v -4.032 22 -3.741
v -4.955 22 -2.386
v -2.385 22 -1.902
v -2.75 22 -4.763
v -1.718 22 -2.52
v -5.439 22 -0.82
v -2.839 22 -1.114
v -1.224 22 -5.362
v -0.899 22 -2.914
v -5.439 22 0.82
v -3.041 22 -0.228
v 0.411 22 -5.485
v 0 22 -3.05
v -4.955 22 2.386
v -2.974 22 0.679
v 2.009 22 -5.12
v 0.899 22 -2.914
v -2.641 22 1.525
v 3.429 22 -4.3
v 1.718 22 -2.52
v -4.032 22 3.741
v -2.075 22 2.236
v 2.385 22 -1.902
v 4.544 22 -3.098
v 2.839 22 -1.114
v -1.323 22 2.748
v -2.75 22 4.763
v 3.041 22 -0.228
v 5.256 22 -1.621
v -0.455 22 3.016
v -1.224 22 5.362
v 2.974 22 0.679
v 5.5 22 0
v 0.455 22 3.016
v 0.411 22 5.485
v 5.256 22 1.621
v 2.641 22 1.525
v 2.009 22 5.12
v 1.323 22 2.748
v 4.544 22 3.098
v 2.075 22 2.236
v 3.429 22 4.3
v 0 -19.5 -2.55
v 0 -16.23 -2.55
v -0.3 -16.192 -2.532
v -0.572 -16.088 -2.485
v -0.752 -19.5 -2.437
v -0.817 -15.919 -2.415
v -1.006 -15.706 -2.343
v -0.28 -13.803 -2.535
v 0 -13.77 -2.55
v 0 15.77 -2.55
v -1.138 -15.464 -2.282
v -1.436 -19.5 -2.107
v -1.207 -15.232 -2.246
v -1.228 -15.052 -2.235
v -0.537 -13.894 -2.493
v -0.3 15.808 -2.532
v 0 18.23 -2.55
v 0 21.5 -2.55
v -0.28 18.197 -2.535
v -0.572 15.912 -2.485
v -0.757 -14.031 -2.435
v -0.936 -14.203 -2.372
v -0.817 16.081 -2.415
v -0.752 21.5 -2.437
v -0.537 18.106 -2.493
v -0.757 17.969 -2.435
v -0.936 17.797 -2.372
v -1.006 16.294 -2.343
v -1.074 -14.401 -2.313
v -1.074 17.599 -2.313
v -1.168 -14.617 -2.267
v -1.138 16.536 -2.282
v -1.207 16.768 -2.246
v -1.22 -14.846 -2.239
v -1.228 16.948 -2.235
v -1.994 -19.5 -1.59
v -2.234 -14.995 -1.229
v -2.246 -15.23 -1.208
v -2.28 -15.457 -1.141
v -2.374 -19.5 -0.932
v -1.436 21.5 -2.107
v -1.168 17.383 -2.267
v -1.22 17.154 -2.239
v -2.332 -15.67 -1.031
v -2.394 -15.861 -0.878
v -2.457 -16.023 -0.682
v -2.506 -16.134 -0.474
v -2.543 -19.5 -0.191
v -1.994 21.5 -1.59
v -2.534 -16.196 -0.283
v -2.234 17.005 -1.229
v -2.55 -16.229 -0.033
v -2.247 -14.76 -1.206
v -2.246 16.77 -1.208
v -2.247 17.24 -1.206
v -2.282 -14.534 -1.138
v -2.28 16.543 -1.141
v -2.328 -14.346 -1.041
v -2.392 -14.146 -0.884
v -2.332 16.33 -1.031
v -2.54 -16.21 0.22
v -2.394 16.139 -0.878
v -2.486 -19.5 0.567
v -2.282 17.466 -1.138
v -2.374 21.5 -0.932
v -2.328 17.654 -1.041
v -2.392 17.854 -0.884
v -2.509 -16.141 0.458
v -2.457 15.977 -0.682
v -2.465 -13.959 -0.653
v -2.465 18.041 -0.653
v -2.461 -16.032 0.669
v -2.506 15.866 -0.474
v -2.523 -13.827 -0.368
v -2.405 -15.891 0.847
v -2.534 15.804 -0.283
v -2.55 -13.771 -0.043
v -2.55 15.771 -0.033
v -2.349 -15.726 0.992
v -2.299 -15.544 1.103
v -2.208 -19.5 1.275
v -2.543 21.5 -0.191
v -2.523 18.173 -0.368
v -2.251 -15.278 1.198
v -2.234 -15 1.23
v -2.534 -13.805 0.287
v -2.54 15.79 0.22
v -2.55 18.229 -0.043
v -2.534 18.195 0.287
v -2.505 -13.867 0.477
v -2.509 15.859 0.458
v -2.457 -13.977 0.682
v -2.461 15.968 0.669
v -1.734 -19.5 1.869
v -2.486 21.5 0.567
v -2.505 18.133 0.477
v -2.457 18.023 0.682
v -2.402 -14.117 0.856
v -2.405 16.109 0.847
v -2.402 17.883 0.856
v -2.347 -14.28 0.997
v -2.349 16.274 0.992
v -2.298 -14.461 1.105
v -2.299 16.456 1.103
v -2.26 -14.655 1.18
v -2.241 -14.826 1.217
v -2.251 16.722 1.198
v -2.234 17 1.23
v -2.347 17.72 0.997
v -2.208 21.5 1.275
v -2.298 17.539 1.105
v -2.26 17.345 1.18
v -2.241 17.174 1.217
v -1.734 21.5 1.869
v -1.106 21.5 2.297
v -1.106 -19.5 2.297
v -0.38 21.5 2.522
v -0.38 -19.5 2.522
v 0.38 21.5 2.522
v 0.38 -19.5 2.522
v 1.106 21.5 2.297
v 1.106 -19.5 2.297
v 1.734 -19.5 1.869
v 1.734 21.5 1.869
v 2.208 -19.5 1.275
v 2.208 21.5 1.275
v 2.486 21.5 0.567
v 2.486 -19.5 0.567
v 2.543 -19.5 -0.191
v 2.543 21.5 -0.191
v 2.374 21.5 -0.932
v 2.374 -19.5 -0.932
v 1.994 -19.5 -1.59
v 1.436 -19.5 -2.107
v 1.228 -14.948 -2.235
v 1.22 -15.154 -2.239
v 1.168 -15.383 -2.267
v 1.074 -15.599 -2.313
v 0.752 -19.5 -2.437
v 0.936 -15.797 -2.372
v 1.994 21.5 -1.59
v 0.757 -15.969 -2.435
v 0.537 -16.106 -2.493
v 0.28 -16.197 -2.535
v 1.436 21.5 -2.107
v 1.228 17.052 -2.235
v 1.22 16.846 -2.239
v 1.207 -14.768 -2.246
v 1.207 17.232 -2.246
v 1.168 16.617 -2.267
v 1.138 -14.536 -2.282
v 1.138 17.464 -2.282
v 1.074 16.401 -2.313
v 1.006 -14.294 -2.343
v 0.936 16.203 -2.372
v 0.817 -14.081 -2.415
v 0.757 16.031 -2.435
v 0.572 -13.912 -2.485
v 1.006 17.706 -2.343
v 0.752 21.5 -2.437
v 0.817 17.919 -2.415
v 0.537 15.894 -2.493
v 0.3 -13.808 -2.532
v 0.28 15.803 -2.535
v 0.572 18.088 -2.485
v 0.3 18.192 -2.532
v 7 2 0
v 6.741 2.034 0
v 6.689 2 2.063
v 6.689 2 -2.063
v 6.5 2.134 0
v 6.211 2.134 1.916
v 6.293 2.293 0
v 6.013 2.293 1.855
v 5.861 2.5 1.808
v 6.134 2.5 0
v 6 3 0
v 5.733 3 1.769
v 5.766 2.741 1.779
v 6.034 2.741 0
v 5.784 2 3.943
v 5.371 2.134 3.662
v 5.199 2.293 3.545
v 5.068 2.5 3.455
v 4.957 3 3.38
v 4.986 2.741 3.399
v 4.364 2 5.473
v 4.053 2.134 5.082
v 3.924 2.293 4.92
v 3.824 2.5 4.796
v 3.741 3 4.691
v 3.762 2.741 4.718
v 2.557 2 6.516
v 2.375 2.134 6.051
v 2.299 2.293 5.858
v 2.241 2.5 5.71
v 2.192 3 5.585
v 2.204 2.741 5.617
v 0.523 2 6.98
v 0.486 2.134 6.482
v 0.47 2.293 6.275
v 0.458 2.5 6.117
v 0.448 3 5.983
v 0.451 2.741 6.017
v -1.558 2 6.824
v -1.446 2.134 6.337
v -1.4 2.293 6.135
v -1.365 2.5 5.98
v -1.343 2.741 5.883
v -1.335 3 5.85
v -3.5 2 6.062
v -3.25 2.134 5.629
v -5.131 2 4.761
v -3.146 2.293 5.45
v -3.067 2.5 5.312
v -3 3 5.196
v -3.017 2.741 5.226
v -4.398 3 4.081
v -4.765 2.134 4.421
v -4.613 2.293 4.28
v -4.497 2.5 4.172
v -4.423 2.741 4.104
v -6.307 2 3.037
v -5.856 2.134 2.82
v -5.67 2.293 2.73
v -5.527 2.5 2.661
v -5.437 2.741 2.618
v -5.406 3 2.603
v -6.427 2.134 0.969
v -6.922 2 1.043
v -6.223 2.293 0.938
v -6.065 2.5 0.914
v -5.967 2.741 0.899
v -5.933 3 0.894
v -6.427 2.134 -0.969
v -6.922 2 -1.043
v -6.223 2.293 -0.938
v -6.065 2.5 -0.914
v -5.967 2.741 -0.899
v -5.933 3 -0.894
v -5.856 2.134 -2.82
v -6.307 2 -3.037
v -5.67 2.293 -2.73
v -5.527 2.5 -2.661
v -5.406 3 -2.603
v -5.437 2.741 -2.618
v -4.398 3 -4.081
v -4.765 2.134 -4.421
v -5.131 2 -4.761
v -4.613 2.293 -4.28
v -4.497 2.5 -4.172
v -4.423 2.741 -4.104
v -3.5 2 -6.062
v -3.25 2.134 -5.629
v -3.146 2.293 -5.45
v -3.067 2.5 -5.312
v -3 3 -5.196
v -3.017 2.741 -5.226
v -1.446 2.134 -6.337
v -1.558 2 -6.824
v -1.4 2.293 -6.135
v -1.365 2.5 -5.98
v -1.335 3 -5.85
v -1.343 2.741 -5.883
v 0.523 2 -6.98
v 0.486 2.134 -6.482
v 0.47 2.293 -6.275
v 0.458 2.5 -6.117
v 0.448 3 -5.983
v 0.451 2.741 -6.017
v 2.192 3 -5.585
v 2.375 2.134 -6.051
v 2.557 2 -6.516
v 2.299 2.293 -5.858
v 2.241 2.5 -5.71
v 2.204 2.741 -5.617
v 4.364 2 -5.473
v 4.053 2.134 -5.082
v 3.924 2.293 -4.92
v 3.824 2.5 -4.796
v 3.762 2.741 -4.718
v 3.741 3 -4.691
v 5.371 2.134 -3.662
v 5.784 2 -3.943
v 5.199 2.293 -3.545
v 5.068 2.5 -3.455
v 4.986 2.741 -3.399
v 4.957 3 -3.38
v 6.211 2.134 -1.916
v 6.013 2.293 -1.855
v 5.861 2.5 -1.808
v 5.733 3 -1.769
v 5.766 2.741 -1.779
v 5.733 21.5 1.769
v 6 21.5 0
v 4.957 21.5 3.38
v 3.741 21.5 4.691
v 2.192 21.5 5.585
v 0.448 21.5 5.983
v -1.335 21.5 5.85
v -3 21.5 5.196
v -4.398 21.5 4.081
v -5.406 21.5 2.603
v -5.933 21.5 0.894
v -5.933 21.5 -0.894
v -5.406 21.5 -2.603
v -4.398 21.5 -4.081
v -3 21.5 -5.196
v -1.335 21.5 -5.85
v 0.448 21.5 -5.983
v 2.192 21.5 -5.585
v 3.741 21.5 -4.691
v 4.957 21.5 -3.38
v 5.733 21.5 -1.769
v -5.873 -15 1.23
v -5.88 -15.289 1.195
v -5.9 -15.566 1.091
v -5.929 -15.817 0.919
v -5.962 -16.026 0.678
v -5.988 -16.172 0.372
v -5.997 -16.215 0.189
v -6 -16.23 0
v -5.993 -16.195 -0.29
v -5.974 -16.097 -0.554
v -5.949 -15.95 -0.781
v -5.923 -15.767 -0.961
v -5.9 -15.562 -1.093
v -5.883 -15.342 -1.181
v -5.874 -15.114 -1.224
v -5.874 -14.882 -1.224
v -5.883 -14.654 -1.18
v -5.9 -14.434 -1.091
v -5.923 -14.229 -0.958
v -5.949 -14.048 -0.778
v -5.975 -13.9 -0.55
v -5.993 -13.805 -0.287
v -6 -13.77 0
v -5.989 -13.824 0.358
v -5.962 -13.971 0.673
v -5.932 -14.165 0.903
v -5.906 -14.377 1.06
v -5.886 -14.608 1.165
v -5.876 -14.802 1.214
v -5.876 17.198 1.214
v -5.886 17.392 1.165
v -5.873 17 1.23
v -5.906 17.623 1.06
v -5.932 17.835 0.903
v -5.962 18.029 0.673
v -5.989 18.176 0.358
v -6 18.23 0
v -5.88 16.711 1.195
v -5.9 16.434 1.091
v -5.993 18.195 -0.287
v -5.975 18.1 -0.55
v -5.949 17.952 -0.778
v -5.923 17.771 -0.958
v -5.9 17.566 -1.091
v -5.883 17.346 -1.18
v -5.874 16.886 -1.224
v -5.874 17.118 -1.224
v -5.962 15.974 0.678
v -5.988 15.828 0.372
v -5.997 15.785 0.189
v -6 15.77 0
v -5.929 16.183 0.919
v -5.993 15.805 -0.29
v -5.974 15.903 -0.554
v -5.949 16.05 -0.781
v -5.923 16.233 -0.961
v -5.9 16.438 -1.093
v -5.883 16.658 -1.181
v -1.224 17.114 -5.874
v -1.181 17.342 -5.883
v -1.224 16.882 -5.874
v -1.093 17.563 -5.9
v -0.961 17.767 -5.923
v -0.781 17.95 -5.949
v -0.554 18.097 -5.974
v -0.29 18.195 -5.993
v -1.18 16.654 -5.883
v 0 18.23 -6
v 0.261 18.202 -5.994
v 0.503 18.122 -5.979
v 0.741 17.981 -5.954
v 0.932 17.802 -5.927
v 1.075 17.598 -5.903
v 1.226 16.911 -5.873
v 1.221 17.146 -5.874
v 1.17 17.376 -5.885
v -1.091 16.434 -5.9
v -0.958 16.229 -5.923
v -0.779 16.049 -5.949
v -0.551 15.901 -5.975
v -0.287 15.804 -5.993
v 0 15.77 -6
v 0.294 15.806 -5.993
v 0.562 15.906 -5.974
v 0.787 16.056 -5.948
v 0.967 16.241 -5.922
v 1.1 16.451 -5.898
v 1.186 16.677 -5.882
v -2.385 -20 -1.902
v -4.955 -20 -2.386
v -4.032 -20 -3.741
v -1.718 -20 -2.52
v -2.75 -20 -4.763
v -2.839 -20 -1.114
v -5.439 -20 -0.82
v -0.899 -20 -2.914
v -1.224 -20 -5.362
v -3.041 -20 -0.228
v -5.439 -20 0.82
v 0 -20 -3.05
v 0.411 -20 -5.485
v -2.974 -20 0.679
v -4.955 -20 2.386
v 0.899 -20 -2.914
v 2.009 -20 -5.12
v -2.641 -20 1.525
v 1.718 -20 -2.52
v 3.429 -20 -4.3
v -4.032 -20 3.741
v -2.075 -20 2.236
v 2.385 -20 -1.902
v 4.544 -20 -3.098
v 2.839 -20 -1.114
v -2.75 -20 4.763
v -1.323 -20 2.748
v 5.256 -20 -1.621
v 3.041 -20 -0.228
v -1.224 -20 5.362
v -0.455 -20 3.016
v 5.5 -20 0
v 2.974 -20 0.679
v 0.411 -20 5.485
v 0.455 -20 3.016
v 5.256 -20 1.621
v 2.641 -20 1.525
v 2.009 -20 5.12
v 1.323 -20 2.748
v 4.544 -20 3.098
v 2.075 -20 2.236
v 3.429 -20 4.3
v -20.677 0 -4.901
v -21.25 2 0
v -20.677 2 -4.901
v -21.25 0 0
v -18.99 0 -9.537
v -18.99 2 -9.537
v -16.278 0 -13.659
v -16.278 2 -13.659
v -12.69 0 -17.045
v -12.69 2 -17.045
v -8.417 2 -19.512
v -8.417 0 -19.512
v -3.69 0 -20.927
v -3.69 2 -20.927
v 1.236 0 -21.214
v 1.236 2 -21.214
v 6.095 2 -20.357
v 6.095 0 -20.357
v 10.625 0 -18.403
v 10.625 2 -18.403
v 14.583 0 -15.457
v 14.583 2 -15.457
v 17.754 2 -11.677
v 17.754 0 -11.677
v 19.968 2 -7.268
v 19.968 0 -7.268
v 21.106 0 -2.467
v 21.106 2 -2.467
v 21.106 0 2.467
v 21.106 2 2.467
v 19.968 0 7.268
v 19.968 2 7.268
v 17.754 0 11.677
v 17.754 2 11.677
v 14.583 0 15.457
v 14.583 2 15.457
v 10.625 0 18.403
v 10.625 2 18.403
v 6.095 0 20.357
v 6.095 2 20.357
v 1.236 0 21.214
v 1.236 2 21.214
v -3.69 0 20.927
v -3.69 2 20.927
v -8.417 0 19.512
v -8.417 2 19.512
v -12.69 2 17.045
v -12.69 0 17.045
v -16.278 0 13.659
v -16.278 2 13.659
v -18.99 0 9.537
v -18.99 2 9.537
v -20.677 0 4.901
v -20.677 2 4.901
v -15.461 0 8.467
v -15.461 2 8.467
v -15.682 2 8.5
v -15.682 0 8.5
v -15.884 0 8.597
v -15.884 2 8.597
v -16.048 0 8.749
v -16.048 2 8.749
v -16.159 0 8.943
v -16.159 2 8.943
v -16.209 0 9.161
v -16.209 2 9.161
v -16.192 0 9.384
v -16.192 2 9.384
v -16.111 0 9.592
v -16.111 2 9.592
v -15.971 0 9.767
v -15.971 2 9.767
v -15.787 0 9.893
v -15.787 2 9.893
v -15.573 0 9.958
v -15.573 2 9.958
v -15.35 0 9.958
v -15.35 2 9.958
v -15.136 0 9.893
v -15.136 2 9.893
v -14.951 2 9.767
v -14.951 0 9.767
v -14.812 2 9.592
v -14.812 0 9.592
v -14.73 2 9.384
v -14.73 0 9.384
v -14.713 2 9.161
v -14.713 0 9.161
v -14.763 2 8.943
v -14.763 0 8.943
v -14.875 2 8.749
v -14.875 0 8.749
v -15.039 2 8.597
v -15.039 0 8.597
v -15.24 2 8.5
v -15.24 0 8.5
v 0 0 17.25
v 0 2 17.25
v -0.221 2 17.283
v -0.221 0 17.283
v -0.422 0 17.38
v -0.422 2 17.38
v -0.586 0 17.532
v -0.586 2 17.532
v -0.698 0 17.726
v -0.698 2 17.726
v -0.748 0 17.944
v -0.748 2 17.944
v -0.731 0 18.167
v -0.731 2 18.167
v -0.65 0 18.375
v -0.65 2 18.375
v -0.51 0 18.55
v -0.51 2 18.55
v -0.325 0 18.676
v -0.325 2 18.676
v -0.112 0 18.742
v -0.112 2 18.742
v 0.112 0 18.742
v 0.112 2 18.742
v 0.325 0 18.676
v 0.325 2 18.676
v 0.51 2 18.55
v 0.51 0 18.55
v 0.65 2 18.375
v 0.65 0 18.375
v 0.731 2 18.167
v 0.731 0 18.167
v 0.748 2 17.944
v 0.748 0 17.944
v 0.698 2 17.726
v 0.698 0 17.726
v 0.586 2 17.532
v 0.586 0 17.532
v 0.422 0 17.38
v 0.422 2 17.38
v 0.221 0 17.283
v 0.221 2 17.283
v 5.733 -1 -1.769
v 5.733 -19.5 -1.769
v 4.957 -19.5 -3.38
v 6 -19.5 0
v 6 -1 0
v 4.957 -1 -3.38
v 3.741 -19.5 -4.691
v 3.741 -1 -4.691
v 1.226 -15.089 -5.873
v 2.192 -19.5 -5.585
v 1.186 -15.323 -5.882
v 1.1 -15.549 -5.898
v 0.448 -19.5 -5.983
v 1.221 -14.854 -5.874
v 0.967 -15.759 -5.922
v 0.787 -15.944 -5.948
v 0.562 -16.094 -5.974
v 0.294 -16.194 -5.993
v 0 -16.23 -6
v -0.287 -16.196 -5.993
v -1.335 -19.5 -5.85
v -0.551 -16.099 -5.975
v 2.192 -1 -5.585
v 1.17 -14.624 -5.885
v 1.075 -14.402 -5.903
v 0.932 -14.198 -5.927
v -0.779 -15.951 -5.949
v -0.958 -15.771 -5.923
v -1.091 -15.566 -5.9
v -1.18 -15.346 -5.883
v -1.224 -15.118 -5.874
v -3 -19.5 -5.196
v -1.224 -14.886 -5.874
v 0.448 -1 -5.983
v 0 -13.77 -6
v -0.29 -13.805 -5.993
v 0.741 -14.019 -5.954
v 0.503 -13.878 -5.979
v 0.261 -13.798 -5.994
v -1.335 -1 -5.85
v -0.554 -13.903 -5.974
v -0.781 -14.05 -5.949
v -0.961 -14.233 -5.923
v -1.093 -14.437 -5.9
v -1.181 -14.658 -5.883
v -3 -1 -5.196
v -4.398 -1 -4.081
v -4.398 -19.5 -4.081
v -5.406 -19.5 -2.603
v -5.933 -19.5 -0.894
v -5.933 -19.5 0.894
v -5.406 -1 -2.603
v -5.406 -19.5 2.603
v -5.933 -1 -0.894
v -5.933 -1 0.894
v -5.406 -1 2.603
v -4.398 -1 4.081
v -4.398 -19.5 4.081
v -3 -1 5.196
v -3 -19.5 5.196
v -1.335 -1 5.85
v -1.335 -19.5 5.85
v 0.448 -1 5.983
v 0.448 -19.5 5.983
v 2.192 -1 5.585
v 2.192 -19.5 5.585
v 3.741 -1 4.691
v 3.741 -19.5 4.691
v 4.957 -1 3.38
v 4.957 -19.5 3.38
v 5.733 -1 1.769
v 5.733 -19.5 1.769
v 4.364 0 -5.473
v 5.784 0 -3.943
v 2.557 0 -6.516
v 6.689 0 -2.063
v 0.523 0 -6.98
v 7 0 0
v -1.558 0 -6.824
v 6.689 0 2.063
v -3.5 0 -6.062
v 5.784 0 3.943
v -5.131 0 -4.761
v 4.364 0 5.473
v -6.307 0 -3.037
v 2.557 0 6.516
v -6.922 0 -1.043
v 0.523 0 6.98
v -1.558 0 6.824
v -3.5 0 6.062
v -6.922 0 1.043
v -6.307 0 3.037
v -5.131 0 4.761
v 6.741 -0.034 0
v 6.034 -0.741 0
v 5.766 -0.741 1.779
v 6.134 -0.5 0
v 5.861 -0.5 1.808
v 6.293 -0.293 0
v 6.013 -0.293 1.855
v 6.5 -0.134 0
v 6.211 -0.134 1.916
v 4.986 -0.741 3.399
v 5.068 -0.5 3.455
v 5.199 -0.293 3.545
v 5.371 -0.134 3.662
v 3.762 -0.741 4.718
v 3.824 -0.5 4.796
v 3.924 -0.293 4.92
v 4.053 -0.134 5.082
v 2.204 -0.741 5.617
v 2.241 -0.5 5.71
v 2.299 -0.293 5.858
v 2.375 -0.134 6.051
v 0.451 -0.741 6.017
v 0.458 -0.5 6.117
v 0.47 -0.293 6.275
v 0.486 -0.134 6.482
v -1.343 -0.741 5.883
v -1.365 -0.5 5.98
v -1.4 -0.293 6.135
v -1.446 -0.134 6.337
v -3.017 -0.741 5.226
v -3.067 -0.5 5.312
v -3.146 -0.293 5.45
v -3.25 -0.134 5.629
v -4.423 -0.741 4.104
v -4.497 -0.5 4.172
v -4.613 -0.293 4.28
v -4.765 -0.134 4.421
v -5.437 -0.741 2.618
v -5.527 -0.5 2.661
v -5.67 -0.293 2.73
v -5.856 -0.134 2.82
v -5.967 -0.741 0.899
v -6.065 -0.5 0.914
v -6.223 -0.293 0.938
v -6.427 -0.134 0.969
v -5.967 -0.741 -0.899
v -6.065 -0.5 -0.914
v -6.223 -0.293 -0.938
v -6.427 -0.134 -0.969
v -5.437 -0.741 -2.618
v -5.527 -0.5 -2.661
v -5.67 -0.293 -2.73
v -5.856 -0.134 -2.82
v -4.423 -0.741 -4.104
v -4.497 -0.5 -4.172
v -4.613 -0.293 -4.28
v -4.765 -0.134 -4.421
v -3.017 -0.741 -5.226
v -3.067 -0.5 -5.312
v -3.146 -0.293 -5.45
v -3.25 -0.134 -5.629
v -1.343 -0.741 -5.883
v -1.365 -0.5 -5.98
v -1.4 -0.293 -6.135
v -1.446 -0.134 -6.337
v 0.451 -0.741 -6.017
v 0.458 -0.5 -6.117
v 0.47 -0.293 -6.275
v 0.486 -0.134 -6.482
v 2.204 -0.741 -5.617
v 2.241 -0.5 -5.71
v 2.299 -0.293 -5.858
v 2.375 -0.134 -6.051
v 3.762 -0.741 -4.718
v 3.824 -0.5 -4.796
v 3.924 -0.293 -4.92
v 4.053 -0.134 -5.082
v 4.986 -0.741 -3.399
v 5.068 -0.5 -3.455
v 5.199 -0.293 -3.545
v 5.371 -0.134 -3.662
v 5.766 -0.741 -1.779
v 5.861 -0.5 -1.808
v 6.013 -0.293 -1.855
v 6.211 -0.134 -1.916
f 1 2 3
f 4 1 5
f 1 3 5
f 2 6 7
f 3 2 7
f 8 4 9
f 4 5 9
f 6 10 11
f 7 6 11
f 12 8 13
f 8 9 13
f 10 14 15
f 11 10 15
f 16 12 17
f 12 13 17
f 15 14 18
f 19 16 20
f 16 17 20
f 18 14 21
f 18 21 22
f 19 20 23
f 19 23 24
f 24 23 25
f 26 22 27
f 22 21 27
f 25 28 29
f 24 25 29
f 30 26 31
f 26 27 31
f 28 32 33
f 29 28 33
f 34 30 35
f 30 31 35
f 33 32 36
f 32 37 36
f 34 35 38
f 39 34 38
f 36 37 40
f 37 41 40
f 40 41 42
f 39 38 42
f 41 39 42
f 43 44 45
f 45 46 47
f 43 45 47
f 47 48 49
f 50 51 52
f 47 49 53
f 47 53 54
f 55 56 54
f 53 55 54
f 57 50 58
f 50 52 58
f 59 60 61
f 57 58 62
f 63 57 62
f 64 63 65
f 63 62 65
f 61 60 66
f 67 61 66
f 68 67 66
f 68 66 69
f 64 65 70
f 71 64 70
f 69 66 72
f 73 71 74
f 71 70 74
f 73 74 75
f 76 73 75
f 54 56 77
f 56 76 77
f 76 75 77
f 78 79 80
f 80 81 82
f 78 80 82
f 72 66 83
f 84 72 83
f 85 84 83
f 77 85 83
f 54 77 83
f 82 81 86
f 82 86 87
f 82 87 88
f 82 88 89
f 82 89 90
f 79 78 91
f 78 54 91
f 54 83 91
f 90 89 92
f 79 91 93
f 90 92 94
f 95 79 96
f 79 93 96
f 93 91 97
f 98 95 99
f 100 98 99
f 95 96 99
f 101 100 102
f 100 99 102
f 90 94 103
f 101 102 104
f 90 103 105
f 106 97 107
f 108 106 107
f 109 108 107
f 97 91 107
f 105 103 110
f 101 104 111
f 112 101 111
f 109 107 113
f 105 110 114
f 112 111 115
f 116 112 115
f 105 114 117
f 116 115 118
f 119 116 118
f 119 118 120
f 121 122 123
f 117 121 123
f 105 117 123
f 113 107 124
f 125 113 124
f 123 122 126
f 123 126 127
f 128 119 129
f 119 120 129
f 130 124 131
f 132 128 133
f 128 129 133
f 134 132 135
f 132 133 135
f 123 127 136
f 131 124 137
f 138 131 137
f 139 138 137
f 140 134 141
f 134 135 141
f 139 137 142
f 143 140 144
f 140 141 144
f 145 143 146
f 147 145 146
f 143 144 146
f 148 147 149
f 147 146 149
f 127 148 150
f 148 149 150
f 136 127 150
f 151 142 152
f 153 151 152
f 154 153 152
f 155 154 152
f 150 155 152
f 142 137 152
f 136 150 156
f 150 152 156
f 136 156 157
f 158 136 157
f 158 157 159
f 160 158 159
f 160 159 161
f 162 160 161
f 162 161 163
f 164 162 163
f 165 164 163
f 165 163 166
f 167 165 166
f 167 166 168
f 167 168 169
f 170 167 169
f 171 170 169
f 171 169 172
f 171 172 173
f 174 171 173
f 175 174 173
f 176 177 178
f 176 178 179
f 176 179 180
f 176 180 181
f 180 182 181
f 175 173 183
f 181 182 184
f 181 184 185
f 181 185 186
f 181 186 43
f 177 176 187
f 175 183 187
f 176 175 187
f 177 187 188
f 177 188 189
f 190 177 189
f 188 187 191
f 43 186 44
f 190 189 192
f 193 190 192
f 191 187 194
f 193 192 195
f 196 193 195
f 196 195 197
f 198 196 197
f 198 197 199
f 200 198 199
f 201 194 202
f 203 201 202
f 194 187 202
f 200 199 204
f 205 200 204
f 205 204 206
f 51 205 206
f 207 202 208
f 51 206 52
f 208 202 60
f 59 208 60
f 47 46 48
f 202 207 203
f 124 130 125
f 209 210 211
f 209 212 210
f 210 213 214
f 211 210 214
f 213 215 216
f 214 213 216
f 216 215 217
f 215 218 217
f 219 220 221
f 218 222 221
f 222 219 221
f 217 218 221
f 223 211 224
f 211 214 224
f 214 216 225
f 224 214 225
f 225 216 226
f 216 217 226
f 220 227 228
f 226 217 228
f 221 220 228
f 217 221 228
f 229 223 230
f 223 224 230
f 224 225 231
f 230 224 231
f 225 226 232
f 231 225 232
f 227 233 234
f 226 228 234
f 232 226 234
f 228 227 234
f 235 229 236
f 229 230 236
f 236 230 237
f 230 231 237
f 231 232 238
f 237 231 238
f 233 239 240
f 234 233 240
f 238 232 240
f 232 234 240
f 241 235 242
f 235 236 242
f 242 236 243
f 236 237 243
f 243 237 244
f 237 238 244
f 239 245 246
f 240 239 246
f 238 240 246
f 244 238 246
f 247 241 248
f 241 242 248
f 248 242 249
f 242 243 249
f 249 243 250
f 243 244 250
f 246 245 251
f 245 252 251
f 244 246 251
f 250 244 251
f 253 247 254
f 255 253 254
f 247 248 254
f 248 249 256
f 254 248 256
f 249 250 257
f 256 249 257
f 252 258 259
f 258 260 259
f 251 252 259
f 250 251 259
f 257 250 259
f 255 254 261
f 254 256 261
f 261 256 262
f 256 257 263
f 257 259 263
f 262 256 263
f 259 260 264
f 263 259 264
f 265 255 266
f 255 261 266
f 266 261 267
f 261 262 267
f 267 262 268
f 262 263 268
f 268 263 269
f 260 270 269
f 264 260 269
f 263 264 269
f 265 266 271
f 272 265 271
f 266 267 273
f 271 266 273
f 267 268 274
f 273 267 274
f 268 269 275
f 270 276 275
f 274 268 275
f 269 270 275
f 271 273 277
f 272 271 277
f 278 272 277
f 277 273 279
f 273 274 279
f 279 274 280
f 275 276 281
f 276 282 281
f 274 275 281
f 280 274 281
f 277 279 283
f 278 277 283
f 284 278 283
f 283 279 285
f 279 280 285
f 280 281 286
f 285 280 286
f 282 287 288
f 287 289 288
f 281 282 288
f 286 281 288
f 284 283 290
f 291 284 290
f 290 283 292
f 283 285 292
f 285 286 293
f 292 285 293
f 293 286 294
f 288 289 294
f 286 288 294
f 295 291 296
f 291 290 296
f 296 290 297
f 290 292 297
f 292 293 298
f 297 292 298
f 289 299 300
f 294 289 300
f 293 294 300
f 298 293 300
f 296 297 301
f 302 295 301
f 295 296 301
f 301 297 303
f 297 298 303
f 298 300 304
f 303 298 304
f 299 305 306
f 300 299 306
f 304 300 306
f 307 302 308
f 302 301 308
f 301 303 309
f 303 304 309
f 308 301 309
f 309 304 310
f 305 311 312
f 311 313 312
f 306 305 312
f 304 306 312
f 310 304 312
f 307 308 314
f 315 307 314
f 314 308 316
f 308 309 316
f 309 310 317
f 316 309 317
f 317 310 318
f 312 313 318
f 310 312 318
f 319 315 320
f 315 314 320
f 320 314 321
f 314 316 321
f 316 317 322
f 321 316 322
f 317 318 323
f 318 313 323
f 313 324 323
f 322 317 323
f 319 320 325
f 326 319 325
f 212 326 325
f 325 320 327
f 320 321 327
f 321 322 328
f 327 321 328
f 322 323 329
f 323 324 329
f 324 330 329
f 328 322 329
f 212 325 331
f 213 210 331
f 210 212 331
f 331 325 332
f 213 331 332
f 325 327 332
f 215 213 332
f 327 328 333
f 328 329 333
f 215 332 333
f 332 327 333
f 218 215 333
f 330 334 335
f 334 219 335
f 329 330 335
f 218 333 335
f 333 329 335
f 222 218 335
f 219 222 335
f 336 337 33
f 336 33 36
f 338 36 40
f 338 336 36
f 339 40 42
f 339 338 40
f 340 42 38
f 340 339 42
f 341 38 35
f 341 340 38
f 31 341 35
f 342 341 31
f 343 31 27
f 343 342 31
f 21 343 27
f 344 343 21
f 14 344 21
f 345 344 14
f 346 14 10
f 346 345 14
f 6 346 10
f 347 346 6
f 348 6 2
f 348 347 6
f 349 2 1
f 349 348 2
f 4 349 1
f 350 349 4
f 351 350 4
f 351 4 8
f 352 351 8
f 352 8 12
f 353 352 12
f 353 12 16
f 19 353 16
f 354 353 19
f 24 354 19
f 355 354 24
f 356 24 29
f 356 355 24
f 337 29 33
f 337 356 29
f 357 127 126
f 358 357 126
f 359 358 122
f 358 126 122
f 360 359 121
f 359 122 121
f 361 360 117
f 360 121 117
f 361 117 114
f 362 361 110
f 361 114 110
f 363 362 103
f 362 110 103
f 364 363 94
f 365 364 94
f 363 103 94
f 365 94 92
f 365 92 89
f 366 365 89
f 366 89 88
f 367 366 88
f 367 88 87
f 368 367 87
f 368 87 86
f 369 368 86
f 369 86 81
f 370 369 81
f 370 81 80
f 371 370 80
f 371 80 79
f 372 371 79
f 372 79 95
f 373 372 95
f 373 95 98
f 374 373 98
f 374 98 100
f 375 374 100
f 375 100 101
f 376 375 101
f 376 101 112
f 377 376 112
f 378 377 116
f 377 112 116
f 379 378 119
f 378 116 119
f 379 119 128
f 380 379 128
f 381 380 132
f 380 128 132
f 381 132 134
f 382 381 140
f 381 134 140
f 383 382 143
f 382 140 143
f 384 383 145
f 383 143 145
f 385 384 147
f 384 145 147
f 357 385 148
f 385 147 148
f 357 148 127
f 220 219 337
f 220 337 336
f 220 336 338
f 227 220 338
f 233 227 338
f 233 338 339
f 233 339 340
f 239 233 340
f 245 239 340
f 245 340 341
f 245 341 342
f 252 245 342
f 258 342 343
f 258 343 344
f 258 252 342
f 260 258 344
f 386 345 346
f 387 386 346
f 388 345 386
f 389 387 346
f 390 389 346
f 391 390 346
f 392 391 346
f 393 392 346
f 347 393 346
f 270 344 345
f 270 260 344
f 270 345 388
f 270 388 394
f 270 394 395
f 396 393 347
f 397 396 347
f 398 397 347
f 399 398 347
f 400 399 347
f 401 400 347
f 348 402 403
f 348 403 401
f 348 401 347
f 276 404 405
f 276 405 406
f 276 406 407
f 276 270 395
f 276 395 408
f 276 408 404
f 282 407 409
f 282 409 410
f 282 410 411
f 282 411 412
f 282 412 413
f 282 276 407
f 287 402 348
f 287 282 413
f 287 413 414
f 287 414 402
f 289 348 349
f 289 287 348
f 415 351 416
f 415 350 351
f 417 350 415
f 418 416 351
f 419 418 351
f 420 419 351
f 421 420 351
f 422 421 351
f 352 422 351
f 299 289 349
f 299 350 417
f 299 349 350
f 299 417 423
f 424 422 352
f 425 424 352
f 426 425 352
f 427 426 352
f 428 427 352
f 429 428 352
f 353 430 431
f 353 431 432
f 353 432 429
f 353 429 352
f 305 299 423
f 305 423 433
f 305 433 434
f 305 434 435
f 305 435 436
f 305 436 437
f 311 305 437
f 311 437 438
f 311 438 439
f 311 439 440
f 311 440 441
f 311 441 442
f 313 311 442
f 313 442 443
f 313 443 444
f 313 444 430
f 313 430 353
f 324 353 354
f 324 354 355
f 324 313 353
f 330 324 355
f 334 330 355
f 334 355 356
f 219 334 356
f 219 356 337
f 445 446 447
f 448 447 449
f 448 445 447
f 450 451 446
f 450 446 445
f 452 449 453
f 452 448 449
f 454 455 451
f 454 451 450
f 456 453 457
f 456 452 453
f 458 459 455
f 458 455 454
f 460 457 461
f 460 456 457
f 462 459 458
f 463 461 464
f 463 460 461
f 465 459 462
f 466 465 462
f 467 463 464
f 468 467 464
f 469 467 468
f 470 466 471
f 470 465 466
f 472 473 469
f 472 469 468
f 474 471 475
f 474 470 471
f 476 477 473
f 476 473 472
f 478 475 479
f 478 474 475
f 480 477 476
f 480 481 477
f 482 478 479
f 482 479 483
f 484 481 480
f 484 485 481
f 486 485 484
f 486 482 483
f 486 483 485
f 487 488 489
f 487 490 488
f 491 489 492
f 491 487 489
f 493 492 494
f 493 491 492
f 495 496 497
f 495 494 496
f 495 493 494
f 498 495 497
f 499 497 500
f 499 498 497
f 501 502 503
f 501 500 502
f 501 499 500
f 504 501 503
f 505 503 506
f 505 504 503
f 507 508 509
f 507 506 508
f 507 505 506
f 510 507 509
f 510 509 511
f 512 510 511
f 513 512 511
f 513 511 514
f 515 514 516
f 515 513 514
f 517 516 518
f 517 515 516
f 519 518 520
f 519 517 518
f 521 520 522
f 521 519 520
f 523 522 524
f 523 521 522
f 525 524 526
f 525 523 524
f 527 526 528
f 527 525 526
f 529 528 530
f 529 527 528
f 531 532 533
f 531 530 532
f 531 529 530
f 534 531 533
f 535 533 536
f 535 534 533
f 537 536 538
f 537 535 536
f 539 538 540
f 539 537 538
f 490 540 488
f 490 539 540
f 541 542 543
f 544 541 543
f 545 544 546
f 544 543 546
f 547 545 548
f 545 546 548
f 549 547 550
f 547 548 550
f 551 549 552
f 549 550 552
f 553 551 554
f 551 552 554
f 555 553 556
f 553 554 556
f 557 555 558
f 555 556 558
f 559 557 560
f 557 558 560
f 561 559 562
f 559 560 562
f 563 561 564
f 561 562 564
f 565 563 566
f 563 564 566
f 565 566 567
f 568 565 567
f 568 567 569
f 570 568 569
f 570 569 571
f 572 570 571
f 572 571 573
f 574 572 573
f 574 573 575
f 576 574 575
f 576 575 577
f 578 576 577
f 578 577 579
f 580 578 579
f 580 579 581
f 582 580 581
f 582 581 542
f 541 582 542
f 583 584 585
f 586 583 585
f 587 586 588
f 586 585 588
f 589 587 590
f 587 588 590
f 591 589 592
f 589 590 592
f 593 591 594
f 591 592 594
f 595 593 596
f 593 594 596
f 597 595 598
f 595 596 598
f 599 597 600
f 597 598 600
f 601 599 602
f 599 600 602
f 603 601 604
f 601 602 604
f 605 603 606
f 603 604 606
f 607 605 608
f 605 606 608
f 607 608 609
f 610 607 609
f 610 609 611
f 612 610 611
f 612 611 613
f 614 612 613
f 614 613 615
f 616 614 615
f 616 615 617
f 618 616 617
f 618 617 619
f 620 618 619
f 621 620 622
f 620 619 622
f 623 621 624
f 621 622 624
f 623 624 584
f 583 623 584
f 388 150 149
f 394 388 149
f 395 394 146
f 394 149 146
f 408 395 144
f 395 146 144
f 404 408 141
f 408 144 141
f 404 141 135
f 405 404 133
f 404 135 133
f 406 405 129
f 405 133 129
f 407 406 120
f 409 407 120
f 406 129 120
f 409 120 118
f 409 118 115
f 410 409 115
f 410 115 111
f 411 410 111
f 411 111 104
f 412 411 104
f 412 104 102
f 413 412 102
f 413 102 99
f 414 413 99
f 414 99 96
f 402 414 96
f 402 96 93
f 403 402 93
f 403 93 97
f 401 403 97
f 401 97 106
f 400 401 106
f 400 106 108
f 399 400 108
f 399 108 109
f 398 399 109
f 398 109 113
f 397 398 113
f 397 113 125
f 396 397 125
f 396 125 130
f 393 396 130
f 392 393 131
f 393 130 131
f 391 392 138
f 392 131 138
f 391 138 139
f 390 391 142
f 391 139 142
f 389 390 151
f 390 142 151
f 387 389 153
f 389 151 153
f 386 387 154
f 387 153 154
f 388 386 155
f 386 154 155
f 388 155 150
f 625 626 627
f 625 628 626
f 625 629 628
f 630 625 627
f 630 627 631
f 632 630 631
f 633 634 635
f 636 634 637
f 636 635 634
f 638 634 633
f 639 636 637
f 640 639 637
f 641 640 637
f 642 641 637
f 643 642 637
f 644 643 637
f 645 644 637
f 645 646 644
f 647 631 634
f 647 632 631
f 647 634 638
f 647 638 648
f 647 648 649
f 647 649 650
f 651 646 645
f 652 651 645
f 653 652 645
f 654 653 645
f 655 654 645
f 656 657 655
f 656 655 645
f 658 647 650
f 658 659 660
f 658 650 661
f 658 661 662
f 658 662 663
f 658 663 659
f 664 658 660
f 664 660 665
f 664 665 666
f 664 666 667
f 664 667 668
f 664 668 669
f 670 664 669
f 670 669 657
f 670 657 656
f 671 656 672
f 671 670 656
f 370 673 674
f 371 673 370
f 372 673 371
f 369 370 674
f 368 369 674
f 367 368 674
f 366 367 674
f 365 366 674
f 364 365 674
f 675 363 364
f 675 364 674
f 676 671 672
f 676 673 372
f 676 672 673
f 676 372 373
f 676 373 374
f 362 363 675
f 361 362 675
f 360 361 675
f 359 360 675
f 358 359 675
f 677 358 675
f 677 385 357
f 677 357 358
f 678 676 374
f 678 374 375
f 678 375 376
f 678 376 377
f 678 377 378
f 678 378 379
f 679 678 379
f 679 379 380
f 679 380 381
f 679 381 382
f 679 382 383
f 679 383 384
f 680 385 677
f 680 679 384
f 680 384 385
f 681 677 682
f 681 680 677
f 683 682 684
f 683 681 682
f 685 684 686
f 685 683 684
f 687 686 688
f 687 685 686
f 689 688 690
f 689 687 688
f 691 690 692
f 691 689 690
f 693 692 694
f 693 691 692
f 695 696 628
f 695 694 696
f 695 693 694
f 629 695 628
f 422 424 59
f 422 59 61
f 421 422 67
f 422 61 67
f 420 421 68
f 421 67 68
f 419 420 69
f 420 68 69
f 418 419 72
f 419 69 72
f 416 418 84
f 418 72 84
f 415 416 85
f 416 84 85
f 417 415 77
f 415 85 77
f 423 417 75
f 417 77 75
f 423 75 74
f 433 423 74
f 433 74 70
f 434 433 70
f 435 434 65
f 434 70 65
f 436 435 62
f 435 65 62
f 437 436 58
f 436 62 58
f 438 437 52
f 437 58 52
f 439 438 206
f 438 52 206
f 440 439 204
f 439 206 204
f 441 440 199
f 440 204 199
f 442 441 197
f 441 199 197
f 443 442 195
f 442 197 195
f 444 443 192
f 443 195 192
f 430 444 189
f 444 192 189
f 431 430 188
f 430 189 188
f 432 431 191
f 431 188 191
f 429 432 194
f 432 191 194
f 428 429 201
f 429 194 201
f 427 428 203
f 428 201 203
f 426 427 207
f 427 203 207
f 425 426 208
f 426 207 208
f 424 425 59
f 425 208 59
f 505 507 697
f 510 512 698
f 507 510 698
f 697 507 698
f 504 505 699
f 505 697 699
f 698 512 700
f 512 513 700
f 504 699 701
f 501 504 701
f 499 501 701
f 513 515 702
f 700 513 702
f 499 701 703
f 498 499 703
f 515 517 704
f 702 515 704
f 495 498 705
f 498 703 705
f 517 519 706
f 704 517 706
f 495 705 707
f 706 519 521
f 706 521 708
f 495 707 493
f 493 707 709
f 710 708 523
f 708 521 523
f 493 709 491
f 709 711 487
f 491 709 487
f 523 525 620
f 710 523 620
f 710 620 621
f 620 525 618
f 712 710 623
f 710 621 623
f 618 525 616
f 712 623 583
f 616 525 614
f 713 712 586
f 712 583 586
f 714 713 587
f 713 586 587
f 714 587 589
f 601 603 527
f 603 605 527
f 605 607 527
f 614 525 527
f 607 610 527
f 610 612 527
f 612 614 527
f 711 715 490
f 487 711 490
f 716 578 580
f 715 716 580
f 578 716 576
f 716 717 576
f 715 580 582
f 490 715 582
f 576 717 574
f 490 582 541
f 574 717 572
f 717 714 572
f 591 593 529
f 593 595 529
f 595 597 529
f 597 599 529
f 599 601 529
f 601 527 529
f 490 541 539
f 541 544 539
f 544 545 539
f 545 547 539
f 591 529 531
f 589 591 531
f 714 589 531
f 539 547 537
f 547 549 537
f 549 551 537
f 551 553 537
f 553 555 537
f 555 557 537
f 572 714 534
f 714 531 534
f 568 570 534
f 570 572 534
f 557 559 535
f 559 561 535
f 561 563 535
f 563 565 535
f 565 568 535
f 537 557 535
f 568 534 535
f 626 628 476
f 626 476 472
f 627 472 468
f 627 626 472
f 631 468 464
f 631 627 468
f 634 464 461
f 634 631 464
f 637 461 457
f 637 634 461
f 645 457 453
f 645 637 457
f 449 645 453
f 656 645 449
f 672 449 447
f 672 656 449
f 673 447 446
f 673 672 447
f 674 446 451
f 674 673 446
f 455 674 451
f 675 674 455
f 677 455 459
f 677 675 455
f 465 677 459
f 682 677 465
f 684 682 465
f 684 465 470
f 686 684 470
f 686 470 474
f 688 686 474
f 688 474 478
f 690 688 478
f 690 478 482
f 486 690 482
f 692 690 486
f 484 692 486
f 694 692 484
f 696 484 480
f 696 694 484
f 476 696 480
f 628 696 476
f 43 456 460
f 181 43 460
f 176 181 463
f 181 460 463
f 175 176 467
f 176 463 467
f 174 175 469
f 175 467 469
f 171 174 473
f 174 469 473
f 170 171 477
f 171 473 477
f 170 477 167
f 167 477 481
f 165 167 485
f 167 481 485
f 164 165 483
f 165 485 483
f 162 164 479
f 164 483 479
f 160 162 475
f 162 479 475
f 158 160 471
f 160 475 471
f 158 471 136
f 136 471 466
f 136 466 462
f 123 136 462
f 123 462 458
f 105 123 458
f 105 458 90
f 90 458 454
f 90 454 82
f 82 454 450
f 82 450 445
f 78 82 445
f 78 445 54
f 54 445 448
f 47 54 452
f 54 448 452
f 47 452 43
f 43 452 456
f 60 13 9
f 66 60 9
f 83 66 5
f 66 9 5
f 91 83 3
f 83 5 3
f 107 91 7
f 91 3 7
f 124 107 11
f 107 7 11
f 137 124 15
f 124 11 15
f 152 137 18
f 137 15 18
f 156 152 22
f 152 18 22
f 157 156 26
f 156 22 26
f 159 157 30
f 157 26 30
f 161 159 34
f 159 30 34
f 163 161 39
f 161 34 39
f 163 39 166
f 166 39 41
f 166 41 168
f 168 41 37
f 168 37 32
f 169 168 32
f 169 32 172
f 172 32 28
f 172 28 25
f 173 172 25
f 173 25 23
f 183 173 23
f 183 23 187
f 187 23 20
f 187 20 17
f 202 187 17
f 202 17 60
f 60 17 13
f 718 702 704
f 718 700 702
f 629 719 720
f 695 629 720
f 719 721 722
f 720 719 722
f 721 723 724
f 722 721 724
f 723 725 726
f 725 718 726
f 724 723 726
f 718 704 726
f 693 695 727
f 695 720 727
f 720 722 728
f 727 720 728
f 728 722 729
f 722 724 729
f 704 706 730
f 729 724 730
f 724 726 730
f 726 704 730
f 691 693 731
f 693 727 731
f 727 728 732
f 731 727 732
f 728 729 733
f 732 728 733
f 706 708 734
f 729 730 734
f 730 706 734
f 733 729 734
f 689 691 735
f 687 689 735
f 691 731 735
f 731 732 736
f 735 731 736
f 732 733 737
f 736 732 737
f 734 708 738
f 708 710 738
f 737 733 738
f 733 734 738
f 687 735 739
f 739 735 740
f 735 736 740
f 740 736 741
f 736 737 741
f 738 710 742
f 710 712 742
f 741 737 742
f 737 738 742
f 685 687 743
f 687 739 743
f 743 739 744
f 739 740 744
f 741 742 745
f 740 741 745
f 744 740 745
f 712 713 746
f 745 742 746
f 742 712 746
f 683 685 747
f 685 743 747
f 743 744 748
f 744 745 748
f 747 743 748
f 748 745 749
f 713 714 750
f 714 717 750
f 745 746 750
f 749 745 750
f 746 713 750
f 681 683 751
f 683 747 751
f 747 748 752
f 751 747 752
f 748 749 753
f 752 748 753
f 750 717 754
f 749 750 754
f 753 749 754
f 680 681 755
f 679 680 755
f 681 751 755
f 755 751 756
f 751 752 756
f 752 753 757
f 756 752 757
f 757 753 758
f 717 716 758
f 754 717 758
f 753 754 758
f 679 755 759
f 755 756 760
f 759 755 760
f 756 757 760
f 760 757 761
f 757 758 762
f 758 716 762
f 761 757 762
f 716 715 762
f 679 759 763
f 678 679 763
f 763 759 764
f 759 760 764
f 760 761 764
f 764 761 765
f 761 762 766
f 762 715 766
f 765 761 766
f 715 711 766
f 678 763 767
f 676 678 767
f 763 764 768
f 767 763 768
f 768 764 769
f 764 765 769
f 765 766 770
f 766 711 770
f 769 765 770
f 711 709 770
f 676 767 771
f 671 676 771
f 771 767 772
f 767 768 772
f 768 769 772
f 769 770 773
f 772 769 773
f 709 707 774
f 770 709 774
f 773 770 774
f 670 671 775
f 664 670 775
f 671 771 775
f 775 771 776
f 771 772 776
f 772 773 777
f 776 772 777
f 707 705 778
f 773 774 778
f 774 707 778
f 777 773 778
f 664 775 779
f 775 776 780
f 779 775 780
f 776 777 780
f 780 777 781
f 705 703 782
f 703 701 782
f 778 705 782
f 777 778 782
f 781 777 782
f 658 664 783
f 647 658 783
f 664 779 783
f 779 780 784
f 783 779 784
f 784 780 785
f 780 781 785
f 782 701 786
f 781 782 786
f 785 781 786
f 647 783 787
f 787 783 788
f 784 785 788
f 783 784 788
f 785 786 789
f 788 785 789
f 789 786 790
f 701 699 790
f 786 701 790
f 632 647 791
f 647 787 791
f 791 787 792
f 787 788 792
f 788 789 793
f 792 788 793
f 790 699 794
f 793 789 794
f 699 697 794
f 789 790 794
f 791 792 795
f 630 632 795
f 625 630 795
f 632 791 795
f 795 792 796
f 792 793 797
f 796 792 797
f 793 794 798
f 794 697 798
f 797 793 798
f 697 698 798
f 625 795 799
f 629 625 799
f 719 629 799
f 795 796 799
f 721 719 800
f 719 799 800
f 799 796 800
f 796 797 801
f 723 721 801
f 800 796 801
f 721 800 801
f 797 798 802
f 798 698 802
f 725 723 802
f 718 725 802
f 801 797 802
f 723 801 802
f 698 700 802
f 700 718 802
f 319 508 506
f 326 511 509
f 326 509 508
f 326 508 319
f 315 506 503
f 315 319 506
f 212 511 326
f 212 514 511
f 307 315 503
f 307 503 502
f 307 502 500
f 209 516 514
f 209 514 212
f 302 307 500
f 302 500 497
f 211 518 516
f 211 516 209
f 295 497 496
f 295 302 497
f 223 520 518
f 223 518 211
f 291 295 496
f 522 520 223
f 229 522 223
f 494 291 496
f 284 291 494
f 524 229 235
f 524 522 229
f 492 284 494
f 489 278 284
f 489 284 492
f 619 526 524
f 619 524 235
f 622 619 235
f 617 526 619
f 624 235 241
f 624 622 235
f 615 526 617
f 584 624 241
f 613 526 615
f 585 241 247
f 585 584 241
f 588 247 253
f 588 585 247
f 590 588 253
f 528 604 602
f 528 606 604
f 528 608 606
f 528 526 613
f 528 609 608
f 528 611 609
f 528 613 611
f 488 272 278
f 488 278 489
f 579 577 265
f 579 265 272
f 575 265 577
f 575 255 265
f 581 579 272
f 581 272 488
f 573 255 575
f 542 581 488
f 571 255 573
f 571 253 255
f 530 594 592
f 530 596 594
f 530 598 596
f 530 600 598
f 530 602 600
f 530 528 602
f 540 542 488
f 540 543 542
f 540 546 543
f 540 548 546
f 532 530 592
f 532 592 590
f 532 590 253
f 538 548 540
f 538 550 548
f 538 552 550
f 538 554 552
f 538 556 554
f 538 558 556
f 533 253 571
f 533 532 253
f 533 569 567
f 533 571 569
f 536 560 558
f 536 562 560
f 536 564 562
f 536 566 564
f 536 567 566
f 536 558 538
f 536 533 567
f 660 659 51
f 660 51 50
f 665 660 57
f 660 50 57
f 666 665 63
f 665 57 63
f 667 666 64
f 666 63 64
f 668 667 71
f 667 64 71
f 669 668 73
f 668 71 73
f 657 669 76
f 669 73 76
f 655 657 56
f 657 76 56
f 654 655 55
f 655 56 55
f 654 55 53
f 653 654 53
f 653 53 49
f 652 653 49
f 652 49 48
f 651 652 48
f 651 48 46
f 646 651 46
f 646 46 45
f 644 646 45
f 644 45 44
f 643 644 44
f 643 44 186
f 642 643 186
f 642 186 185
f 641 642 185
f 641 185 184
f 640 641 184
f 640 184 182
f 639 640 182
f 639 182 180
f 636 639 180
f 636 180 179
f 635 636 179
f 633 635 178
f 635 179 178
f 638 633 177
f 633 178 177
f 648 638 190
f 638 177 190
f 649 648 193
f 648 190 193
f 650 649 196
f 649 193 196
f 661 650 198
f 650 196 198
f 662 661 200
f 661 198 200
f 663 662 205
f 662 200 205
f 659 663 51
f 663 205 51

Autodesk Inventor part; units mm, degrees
ref_plane "XZ Plane" through (0, 0, 0) normal (0, 1, 0) x (-1, 0, 0)
sketch "Sketch1" plane through (0, 0, 0) normal (0, 1, 0) x (-1, 0, 0)
  circle A0 centre (0, 0) radius 21.25
  circle A1 centre (0, 0) radius 18
  point P0 (0, 18)
  point P1 (15.4613, 9.2168)
  dimension "d0" = 42.5
  dimension "d3" = 3.25
  dimension "d4" = 59.2
extrude "Extrusion1" add sketch "Sketch1" along normal blind 2 contours A0 | A1
hole "Hole1" at (0, 0, 18) at (-15.4613, 0, 9.2168) direction (0, 1, 0) diameter 1.5 depth 8 tip angle 118
sketch "Sketch2" plane through (0, 0, 0) normal (0, -1, 0) x (1, 0, 0)
  circle A0 centre (0, 0) radius 6
  dimension "d19" = 12
extrude "Extrusion2" add sketch "Sketch2" along normal blind 20 and the other way blind 22
chamfer "Chamfer2" distance 0.5 angle 45 2 edges at (-6, 22, 0) (-6, -20, 0)
fillet "Fillet1" radius 1 2 edges at (-6, 0, 0) (-6, 2, 0)
sketch "Sketch3" plane through (0, -20, 0) normal (0, -1, 0) x (1, 0, 0)
  point P0 (0, 0)
  point P1 (0, 0)
hole "Hole3" at (0, -20, 0) direction (0, 1, 0) diameter 5.1 end through all
chamfer "Chamfer3" distance 0.5 angle 45 2 edges at (0, -20, 2.55) (0, 22, 2.55)
ref_plane "Work Plane1" through (-6, 0, 0) normal (1, 0, 0) x (0, 1, 0)
sketch "Sketch4" plane through (-6, 0, 0) normal (1, 0, 0) x (0, 1, 0)
  line L0 (22, 5.5) -> (22, -5.5) projected
  line L1 (-20, -5.5) -> (-20, 5.5) projected
  point P0 (0, 0)
  point P1 (17, 0)
  point P2 (-15, 0)
  dimension "d41" = 5
  dimension "d42" = 5
ref_plane "Work Plane2" through (0, 0, -6) normal (0, 0, 1) x (1, 0, 0)
sketch "Sketch6" plane through (0, 0, -6) normal (0, 0, 1) x (1, 0, 0)
  line L0 (5.5, -20) -> (-5.5, -20) projected
  line L1 (-5.5, 22) -> (5.5, 22) projected
  point P0 (0, 0)
  point P1 (0, -15)
  point P2 (0, 17)
  dimension "d43" = 5
  dimension "d44" = 5
hole "Hole4" at (-6, -15, 0) at (-6, 17, 0) direction (1, 0, 0) diameter 2.459 depth 5.8 tip angle 118 thread size "M3x0.5" class "6H" standard "ISO Metric profile"
hole "Hole5" at (0, -15, -6) at (0, 17, -6) direction (0, 0, 1) diameter 2.459 depth 5.8 tip angle 118 thread size "M3x0.5" class "6H" standard "ISO Metric profile"
properties part number "EncoderDisk"
